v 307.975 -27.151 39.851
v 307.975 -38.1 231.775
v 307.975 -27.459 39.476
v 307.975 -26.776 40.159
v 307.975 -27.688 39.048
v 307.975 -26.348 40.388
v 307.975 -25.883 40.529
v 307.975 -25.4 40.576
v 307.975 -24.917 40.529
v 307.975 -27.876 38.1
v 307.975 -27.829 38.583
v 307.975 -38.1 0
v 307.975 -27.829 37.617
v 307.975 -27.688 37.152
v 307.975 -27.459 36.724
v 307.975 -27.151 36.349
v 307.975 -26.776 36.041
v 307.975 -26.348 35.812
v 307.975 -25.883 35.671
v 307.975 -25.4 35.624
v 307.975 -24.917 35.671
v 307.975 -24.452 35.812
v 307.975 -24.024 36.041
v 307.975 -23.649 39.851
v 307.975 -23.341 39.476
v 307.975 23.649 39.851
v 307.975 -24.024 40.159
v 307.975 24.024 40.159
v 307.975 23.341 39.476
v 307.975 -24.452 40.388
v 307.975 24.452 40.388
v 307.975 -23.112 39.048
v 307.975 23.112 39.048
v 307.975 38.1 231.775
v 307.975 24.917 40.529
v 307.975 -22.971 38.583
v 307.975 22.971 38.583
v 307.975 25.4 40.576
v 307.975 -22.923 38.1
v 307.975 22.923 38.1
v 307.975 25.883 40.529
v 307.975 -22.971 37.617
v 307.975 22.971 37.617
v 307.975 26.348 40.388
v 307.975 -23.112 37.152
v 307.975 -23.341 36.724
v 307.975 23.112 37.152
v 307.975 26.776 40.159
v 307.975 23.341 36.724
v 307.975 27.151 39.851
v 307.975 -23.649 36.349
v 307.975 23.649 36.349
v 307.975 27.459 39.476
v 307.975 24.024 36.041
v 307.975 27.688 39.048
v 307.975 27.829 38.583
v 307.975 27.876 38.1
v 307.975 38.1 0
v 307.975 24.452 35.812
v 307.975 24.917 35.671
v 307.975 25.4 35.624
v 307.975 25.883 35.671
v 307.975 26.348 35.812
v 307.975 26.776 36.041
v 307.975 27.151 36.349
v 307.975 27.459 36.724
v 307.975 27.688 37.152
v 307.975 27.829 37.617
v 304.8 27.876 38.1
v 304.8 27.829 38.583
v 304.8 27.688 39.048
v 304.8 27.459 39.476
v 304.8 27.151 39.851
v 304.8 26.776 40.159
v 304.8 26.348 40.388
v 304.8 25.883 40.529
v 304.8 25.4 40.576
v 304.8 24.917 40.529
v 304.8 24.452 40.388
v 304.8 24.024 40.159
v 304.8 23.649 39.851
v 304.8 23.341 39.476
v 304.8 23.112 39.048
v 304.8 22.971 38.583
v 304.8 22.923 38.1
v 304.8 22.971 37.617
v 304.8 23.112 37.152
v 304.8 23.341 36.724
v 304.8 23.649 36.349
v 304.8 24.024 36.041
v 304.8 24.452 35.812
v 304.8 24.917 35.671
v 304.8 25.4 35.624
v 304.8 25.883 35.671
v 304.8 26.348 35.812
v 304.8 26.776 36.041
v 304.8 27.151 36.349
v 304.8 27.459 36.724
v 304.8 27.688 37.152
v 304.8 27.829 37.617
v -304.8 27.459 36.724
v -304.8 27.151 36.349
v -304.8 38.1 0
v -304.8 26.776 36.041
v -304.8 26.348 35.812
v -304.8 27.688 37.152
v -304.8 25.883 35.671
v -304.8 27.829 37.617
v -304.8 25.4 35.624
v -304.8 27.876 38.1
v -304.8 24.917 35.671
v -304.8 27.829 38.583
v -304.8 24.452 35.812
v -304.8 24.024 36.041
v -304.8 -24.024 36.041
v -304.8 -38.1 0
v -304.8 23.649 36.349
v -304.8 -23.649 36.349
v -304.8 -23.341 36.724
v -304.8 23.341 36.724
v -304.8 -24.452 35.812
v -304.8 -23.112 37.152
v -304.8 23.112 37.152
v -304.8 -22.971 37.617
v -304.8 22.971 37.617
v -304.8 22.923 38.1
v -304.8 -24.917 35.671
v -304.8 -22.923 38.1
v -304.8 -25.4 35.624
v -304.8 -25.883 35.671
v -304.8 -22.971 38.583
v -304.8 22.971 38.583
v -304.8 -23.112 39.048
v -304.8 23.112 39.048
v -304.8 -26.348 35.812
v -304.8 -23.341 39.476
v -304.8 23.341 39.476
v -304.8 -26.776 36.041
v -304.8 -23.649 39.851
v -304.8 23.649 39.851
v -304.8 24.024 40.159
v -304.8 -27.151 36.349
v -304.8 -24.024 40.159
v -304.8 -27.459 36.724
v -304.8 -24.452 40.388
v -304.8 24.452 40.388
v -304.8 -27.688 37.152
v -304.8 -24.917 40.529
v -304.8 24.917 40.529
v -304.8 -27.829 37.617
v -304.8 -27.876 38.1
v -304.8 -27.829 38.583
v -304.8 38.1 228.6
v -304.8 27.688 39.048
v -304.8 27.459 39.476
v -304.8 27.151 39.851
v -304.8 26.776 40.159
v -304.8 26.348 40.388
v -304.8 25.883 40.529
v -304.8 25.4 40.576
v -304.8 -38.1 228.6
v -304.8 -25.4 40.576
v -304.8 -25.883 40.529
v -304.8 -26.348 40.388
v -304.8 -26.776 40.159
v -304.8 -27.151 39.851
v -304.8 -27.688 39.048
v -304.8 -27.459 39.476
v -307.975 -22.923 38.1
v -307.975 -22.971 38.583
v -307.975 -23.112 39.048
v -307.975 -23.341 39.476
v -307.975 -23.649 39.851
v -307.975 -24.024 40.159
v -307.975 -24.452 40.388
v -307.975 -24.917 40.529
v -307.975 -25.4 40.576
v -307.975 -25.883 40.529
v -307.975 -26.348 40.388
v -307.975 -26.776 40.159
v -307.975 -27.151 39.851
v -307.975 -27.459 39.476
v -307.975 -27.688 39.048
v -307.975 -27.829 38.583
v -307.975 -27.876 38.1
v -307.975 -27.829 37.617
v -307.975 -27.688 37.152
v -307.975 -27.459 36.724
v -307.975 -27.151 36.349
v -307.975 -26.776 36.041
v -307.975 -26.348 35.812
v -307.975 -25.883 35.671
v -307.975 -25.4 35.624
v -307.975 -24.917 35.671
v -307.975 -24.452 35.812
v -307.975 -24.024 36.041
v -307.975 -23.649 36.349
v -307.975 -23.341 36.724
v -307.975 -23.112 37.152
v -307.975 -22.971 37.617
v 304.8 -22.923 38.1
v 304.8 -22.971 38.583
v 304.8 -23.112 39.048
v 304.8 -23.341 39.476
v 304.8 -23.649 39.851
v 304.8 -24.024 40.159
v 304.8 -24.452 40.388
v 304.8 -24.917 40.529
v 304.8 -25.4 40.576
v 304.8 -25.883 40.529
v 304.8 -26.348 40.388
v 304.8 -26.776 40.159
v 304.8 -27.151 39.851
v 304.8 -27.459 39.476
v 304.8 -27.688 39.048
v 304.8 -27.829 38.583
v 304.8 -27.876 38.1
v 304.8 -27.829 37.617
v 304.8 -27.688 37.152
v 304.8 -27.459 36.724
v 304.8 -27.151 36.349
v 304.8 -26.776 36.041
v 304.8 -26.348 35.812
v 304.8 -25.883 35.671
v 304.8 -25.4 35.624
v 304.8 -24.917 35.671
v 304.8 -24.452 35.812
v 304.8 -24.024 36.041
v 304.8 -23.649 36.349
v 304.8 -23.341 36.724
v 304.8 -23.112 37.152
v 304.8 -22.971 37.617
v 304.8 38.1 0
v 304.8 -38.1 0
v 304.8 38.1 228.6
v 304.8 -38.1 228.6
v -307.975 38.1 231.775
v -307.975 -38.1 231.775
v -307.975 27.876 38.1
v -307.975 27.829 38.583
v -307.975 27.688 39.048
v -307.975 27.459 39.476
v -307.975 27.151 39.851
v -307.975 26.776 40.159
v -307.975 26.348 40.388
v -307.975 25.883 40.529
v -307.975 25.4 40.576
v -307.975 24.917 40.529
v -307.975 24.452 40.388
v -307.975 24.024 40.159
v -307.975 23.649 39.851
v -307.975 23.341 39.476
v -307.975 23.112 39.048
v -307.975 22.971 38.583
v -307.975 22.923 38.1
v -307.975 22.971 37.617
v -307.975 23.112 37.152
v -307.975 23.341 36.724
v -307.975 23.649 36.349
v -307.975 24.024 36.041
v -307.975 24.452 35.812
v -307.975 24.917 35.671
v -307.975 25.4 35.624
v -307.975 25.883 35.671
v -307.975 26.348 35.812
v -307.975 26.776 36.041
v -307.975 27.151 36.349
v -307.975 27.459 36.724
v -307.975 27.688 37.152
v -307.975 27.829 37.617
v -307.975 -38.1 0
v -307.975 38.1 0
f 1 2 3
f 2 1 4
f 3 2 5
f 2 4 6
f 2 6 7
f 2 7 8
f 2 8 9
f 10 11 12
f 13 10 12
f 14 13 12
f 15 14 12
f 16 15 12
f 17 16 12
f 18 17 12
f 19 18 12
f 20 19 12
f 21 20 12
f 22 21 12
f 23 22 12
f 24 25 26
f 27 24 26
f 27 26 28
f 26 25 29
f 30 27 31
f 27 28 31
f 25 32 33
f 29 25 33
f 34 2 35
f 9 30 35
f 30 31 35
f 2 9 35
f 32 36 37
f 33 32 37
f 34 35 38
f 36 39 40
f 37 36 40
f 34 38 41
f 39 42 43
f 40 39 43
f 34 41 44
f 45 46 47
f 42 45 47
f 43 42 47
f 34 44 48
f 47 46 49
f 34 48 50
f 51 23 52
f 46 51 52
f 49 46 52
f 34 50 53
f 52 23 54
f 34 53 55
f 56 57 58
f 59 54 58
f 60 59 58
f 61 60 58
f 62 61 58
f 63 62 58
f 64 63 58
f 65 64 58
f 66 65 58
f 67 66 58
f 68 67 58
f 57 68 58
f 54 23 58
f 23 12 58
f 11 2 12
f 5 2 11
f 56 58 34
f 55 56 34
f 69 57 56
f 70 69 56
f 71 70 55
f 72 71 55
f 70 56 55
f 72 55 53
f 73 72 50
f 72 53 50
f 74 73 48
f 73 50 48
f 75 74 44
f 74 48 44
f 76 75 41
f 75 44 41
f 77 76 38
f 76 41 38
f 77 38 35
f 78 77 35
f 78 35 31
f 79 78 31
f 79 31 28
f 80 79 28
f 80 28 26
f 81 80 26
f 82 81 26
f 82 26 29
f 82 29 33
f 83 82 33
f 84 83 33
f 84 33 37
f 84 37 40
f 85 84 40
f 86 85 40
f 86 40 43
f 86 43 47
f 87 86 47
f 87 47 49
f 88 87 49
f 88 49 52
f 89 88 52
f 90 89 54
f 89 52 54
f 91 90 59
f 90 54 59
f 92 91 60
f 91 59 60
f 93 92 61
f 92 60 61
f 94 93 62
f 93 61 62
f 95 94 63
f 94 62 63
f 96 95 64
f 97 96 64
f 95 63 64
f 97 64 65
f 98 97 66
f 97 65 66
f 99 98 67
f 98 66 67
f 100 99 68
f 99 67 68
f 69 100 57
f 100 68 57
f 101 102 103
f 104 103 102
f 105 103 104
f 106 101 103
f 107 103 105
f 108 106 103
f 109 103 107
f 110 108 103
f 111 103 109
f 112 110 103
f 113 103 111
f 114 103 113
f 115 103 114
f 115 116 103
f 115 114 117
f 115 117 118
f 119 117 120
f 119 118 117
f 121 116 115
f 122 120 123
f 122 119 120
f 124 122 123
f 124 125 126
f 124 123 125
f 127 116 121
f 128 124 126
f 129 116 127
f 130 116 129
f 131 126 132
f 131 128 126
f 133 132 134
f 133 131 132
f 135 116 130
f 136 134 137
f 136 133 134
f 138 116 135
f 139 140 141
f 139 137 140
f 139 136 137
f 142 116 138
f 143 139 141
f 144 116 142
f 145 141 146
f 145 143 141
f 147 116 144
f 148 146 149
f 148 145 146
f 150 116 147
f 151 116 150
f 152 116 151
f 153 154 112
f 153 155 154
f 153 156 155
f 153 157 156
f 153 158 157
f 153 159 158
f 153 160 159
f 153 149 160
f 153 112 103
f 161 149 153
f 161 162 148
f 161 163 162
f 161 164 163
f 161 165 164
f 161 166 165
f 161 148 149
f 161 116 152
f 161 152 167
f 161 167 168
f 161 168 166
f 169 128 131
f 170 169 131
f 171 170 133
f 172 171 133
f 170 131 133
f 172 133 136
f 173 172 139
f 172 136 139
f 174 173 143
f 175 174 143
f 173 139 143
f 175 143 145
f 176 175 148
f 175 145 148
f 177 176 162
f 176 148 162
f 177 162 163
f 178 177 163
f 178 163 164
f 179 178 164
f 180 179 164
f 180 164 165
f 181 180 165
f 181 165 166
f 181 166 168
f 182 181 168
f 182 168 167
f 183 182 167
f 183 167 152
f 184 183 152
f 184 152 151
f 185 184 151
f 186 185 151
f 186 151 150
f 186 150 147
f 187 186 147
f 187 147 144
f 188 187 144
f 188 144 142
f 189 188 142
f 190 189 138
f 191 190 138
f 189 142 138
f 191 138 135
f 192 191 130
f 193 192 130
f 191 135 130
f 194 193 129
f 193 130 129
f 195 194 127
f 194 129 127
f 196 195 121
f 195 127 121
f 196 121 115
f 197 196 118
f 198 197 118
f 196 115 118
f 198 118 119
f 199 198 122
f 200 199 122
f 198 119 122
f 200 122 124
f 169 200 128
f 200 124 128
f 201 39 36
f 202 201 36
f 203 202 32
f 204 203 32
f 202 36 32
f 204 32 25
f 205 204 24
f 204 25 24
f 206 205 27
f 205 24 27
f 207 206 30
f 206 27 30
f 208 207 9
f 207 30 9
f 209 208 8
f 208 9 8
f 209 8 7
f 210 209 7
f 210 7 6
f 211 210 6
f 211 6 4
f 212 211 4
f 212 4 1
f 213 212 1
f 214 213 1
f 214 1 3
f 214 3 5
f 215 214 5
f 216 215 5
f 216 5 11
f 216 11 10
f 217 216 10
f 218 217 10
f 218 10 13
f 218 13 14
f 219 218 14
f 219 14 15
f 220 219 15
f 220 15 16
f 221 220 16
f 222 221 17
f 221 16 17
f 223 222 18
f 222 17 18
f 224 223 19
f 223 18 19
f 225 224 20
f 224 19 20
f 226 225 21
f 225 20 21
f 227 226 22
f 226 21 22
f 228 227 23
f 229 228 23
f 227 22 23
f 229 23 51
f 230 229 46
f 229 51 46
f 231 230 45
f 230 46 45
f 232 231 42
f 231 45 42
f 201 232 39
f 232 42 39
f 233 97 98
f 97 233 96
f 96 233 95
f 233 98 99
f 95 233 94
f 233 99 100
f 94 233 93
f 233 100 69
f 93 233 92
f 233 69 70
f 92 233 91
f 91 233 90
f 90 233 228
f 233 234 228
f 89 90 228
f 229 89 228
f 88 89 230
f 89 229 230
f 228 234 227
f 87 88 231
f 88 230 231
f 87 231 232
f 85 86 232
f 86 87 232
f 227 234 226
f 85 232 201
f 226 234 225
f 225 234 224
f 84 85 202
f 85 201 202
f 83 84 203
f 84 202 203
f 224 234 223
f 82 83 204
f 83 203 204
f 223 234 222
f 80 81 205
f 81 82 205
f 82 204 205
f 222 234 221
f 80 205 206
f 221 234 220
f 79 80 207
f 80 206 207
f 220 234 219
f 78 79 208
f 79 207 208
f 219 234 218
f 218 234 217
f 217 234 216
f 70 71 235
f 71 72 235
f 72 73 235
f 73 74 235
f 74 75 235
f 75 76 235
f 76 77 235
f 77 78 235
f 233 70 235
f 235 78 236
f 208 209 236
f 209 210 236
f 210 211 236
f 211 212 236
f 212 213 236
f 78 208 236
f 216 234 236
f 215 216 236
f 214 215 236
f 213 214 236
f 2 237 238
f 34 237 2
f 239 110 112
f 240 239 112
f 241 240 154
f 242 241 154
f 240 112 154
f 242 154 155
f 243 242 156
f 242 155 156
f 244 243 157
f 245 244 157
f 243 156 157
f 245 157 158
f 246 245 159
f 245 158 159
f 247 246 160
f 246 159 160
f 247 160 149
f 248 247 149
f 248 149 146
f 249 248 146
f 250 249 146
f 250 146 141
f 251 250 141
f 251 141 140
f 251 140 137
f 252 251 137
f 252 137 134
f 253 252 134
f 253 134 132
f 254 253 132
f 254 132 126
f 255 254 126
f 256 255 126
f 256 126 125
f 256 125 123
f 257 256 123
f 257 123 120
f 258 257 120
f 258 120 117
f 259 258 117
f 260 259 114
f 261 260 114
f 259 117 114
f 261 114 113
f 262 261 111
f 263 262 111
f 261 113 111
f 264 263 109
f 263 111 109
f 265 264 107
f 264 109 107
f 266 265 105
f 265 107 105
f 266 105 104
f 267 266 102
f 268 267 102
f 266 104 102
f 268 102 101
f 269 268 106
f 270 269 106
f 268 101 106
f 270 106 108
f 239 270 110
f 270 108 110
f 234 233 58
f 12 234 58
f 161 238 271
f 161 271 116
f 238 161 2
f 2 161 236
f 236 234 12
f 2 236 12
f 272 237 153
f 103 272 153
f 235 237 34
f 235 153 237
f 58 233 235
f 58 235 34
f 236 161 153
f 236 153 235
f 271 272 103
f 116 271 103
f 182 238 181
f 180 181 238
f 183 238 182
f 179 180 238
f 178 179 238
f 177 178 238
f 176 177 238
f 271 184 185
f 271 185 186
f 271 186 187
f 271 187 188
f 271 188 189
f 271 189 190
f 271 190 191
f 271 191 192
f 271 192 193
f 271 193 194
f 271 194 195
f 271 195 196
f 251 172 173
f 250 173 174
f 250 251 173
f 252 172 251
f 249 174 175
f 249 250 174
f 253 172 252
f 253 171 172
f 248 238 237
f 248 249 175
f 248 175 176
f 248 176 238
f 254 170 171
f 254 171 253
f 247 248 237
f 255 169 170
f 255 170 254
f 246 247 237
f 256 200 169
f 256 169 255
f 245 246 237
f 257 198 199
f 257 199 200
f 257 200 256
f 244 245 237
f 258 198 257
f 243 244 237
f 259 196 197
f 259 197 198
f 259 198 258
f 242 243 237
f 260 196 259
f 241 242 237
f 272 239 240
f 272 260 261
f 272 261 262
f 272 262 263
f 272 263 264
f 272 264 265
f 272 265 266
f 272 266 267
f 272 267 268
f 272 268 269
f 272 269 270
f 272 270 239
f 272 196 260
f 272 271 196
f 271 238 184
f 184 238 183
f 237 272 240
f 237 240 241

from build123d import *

# Parameters (mm, degrees)
F0_W     = 615.95
F0_H     = 76.2
F1_DEPTH = 231.775
F2_W     = 609.6
F2_H     = 228.6
F3_DEPTH = 76.201
F4_R     = 2.4765
F5_DEPTH = 615.951


with BuildPart() as f1:
    # F0 (on Top) → F1 (new body)
    with BuildSketch(Plane.XY):
        Rectangle(F0_W, F0_H)
    extrude(amount=F1_DEPTH)

    # F2 (on face) → F3 (cut, through all)
    with BuildSketch(Plane.XZ.offset(38.1)):
        with Locations((0, 114.3)):
            Rectangle(F2_W, F2_H)
    extrude(amount=-F3_DEPTH, mode=Mode.SUBTRACT)

    # F4 (on face) → F5 (cut, through all)
    with BuildSketch(Plane.YZ.offset(307.975)):
        with BuildLine():
            ThreePointArc((-27.8765, 38.1), (-25.4, 35.6235), (-22.9235, 38.1))
            ThreePointArc((-22.9235, 38.1), (-25.4, 40.5765), (-27.8765, 38.1))
        make_face()
        with Locations((25.4, 38.1)):
            Circle(F4_R)
    extrude(amount=-F5_DEPTH, mode=Mode.SUBTRACT)


solid = f1.part
